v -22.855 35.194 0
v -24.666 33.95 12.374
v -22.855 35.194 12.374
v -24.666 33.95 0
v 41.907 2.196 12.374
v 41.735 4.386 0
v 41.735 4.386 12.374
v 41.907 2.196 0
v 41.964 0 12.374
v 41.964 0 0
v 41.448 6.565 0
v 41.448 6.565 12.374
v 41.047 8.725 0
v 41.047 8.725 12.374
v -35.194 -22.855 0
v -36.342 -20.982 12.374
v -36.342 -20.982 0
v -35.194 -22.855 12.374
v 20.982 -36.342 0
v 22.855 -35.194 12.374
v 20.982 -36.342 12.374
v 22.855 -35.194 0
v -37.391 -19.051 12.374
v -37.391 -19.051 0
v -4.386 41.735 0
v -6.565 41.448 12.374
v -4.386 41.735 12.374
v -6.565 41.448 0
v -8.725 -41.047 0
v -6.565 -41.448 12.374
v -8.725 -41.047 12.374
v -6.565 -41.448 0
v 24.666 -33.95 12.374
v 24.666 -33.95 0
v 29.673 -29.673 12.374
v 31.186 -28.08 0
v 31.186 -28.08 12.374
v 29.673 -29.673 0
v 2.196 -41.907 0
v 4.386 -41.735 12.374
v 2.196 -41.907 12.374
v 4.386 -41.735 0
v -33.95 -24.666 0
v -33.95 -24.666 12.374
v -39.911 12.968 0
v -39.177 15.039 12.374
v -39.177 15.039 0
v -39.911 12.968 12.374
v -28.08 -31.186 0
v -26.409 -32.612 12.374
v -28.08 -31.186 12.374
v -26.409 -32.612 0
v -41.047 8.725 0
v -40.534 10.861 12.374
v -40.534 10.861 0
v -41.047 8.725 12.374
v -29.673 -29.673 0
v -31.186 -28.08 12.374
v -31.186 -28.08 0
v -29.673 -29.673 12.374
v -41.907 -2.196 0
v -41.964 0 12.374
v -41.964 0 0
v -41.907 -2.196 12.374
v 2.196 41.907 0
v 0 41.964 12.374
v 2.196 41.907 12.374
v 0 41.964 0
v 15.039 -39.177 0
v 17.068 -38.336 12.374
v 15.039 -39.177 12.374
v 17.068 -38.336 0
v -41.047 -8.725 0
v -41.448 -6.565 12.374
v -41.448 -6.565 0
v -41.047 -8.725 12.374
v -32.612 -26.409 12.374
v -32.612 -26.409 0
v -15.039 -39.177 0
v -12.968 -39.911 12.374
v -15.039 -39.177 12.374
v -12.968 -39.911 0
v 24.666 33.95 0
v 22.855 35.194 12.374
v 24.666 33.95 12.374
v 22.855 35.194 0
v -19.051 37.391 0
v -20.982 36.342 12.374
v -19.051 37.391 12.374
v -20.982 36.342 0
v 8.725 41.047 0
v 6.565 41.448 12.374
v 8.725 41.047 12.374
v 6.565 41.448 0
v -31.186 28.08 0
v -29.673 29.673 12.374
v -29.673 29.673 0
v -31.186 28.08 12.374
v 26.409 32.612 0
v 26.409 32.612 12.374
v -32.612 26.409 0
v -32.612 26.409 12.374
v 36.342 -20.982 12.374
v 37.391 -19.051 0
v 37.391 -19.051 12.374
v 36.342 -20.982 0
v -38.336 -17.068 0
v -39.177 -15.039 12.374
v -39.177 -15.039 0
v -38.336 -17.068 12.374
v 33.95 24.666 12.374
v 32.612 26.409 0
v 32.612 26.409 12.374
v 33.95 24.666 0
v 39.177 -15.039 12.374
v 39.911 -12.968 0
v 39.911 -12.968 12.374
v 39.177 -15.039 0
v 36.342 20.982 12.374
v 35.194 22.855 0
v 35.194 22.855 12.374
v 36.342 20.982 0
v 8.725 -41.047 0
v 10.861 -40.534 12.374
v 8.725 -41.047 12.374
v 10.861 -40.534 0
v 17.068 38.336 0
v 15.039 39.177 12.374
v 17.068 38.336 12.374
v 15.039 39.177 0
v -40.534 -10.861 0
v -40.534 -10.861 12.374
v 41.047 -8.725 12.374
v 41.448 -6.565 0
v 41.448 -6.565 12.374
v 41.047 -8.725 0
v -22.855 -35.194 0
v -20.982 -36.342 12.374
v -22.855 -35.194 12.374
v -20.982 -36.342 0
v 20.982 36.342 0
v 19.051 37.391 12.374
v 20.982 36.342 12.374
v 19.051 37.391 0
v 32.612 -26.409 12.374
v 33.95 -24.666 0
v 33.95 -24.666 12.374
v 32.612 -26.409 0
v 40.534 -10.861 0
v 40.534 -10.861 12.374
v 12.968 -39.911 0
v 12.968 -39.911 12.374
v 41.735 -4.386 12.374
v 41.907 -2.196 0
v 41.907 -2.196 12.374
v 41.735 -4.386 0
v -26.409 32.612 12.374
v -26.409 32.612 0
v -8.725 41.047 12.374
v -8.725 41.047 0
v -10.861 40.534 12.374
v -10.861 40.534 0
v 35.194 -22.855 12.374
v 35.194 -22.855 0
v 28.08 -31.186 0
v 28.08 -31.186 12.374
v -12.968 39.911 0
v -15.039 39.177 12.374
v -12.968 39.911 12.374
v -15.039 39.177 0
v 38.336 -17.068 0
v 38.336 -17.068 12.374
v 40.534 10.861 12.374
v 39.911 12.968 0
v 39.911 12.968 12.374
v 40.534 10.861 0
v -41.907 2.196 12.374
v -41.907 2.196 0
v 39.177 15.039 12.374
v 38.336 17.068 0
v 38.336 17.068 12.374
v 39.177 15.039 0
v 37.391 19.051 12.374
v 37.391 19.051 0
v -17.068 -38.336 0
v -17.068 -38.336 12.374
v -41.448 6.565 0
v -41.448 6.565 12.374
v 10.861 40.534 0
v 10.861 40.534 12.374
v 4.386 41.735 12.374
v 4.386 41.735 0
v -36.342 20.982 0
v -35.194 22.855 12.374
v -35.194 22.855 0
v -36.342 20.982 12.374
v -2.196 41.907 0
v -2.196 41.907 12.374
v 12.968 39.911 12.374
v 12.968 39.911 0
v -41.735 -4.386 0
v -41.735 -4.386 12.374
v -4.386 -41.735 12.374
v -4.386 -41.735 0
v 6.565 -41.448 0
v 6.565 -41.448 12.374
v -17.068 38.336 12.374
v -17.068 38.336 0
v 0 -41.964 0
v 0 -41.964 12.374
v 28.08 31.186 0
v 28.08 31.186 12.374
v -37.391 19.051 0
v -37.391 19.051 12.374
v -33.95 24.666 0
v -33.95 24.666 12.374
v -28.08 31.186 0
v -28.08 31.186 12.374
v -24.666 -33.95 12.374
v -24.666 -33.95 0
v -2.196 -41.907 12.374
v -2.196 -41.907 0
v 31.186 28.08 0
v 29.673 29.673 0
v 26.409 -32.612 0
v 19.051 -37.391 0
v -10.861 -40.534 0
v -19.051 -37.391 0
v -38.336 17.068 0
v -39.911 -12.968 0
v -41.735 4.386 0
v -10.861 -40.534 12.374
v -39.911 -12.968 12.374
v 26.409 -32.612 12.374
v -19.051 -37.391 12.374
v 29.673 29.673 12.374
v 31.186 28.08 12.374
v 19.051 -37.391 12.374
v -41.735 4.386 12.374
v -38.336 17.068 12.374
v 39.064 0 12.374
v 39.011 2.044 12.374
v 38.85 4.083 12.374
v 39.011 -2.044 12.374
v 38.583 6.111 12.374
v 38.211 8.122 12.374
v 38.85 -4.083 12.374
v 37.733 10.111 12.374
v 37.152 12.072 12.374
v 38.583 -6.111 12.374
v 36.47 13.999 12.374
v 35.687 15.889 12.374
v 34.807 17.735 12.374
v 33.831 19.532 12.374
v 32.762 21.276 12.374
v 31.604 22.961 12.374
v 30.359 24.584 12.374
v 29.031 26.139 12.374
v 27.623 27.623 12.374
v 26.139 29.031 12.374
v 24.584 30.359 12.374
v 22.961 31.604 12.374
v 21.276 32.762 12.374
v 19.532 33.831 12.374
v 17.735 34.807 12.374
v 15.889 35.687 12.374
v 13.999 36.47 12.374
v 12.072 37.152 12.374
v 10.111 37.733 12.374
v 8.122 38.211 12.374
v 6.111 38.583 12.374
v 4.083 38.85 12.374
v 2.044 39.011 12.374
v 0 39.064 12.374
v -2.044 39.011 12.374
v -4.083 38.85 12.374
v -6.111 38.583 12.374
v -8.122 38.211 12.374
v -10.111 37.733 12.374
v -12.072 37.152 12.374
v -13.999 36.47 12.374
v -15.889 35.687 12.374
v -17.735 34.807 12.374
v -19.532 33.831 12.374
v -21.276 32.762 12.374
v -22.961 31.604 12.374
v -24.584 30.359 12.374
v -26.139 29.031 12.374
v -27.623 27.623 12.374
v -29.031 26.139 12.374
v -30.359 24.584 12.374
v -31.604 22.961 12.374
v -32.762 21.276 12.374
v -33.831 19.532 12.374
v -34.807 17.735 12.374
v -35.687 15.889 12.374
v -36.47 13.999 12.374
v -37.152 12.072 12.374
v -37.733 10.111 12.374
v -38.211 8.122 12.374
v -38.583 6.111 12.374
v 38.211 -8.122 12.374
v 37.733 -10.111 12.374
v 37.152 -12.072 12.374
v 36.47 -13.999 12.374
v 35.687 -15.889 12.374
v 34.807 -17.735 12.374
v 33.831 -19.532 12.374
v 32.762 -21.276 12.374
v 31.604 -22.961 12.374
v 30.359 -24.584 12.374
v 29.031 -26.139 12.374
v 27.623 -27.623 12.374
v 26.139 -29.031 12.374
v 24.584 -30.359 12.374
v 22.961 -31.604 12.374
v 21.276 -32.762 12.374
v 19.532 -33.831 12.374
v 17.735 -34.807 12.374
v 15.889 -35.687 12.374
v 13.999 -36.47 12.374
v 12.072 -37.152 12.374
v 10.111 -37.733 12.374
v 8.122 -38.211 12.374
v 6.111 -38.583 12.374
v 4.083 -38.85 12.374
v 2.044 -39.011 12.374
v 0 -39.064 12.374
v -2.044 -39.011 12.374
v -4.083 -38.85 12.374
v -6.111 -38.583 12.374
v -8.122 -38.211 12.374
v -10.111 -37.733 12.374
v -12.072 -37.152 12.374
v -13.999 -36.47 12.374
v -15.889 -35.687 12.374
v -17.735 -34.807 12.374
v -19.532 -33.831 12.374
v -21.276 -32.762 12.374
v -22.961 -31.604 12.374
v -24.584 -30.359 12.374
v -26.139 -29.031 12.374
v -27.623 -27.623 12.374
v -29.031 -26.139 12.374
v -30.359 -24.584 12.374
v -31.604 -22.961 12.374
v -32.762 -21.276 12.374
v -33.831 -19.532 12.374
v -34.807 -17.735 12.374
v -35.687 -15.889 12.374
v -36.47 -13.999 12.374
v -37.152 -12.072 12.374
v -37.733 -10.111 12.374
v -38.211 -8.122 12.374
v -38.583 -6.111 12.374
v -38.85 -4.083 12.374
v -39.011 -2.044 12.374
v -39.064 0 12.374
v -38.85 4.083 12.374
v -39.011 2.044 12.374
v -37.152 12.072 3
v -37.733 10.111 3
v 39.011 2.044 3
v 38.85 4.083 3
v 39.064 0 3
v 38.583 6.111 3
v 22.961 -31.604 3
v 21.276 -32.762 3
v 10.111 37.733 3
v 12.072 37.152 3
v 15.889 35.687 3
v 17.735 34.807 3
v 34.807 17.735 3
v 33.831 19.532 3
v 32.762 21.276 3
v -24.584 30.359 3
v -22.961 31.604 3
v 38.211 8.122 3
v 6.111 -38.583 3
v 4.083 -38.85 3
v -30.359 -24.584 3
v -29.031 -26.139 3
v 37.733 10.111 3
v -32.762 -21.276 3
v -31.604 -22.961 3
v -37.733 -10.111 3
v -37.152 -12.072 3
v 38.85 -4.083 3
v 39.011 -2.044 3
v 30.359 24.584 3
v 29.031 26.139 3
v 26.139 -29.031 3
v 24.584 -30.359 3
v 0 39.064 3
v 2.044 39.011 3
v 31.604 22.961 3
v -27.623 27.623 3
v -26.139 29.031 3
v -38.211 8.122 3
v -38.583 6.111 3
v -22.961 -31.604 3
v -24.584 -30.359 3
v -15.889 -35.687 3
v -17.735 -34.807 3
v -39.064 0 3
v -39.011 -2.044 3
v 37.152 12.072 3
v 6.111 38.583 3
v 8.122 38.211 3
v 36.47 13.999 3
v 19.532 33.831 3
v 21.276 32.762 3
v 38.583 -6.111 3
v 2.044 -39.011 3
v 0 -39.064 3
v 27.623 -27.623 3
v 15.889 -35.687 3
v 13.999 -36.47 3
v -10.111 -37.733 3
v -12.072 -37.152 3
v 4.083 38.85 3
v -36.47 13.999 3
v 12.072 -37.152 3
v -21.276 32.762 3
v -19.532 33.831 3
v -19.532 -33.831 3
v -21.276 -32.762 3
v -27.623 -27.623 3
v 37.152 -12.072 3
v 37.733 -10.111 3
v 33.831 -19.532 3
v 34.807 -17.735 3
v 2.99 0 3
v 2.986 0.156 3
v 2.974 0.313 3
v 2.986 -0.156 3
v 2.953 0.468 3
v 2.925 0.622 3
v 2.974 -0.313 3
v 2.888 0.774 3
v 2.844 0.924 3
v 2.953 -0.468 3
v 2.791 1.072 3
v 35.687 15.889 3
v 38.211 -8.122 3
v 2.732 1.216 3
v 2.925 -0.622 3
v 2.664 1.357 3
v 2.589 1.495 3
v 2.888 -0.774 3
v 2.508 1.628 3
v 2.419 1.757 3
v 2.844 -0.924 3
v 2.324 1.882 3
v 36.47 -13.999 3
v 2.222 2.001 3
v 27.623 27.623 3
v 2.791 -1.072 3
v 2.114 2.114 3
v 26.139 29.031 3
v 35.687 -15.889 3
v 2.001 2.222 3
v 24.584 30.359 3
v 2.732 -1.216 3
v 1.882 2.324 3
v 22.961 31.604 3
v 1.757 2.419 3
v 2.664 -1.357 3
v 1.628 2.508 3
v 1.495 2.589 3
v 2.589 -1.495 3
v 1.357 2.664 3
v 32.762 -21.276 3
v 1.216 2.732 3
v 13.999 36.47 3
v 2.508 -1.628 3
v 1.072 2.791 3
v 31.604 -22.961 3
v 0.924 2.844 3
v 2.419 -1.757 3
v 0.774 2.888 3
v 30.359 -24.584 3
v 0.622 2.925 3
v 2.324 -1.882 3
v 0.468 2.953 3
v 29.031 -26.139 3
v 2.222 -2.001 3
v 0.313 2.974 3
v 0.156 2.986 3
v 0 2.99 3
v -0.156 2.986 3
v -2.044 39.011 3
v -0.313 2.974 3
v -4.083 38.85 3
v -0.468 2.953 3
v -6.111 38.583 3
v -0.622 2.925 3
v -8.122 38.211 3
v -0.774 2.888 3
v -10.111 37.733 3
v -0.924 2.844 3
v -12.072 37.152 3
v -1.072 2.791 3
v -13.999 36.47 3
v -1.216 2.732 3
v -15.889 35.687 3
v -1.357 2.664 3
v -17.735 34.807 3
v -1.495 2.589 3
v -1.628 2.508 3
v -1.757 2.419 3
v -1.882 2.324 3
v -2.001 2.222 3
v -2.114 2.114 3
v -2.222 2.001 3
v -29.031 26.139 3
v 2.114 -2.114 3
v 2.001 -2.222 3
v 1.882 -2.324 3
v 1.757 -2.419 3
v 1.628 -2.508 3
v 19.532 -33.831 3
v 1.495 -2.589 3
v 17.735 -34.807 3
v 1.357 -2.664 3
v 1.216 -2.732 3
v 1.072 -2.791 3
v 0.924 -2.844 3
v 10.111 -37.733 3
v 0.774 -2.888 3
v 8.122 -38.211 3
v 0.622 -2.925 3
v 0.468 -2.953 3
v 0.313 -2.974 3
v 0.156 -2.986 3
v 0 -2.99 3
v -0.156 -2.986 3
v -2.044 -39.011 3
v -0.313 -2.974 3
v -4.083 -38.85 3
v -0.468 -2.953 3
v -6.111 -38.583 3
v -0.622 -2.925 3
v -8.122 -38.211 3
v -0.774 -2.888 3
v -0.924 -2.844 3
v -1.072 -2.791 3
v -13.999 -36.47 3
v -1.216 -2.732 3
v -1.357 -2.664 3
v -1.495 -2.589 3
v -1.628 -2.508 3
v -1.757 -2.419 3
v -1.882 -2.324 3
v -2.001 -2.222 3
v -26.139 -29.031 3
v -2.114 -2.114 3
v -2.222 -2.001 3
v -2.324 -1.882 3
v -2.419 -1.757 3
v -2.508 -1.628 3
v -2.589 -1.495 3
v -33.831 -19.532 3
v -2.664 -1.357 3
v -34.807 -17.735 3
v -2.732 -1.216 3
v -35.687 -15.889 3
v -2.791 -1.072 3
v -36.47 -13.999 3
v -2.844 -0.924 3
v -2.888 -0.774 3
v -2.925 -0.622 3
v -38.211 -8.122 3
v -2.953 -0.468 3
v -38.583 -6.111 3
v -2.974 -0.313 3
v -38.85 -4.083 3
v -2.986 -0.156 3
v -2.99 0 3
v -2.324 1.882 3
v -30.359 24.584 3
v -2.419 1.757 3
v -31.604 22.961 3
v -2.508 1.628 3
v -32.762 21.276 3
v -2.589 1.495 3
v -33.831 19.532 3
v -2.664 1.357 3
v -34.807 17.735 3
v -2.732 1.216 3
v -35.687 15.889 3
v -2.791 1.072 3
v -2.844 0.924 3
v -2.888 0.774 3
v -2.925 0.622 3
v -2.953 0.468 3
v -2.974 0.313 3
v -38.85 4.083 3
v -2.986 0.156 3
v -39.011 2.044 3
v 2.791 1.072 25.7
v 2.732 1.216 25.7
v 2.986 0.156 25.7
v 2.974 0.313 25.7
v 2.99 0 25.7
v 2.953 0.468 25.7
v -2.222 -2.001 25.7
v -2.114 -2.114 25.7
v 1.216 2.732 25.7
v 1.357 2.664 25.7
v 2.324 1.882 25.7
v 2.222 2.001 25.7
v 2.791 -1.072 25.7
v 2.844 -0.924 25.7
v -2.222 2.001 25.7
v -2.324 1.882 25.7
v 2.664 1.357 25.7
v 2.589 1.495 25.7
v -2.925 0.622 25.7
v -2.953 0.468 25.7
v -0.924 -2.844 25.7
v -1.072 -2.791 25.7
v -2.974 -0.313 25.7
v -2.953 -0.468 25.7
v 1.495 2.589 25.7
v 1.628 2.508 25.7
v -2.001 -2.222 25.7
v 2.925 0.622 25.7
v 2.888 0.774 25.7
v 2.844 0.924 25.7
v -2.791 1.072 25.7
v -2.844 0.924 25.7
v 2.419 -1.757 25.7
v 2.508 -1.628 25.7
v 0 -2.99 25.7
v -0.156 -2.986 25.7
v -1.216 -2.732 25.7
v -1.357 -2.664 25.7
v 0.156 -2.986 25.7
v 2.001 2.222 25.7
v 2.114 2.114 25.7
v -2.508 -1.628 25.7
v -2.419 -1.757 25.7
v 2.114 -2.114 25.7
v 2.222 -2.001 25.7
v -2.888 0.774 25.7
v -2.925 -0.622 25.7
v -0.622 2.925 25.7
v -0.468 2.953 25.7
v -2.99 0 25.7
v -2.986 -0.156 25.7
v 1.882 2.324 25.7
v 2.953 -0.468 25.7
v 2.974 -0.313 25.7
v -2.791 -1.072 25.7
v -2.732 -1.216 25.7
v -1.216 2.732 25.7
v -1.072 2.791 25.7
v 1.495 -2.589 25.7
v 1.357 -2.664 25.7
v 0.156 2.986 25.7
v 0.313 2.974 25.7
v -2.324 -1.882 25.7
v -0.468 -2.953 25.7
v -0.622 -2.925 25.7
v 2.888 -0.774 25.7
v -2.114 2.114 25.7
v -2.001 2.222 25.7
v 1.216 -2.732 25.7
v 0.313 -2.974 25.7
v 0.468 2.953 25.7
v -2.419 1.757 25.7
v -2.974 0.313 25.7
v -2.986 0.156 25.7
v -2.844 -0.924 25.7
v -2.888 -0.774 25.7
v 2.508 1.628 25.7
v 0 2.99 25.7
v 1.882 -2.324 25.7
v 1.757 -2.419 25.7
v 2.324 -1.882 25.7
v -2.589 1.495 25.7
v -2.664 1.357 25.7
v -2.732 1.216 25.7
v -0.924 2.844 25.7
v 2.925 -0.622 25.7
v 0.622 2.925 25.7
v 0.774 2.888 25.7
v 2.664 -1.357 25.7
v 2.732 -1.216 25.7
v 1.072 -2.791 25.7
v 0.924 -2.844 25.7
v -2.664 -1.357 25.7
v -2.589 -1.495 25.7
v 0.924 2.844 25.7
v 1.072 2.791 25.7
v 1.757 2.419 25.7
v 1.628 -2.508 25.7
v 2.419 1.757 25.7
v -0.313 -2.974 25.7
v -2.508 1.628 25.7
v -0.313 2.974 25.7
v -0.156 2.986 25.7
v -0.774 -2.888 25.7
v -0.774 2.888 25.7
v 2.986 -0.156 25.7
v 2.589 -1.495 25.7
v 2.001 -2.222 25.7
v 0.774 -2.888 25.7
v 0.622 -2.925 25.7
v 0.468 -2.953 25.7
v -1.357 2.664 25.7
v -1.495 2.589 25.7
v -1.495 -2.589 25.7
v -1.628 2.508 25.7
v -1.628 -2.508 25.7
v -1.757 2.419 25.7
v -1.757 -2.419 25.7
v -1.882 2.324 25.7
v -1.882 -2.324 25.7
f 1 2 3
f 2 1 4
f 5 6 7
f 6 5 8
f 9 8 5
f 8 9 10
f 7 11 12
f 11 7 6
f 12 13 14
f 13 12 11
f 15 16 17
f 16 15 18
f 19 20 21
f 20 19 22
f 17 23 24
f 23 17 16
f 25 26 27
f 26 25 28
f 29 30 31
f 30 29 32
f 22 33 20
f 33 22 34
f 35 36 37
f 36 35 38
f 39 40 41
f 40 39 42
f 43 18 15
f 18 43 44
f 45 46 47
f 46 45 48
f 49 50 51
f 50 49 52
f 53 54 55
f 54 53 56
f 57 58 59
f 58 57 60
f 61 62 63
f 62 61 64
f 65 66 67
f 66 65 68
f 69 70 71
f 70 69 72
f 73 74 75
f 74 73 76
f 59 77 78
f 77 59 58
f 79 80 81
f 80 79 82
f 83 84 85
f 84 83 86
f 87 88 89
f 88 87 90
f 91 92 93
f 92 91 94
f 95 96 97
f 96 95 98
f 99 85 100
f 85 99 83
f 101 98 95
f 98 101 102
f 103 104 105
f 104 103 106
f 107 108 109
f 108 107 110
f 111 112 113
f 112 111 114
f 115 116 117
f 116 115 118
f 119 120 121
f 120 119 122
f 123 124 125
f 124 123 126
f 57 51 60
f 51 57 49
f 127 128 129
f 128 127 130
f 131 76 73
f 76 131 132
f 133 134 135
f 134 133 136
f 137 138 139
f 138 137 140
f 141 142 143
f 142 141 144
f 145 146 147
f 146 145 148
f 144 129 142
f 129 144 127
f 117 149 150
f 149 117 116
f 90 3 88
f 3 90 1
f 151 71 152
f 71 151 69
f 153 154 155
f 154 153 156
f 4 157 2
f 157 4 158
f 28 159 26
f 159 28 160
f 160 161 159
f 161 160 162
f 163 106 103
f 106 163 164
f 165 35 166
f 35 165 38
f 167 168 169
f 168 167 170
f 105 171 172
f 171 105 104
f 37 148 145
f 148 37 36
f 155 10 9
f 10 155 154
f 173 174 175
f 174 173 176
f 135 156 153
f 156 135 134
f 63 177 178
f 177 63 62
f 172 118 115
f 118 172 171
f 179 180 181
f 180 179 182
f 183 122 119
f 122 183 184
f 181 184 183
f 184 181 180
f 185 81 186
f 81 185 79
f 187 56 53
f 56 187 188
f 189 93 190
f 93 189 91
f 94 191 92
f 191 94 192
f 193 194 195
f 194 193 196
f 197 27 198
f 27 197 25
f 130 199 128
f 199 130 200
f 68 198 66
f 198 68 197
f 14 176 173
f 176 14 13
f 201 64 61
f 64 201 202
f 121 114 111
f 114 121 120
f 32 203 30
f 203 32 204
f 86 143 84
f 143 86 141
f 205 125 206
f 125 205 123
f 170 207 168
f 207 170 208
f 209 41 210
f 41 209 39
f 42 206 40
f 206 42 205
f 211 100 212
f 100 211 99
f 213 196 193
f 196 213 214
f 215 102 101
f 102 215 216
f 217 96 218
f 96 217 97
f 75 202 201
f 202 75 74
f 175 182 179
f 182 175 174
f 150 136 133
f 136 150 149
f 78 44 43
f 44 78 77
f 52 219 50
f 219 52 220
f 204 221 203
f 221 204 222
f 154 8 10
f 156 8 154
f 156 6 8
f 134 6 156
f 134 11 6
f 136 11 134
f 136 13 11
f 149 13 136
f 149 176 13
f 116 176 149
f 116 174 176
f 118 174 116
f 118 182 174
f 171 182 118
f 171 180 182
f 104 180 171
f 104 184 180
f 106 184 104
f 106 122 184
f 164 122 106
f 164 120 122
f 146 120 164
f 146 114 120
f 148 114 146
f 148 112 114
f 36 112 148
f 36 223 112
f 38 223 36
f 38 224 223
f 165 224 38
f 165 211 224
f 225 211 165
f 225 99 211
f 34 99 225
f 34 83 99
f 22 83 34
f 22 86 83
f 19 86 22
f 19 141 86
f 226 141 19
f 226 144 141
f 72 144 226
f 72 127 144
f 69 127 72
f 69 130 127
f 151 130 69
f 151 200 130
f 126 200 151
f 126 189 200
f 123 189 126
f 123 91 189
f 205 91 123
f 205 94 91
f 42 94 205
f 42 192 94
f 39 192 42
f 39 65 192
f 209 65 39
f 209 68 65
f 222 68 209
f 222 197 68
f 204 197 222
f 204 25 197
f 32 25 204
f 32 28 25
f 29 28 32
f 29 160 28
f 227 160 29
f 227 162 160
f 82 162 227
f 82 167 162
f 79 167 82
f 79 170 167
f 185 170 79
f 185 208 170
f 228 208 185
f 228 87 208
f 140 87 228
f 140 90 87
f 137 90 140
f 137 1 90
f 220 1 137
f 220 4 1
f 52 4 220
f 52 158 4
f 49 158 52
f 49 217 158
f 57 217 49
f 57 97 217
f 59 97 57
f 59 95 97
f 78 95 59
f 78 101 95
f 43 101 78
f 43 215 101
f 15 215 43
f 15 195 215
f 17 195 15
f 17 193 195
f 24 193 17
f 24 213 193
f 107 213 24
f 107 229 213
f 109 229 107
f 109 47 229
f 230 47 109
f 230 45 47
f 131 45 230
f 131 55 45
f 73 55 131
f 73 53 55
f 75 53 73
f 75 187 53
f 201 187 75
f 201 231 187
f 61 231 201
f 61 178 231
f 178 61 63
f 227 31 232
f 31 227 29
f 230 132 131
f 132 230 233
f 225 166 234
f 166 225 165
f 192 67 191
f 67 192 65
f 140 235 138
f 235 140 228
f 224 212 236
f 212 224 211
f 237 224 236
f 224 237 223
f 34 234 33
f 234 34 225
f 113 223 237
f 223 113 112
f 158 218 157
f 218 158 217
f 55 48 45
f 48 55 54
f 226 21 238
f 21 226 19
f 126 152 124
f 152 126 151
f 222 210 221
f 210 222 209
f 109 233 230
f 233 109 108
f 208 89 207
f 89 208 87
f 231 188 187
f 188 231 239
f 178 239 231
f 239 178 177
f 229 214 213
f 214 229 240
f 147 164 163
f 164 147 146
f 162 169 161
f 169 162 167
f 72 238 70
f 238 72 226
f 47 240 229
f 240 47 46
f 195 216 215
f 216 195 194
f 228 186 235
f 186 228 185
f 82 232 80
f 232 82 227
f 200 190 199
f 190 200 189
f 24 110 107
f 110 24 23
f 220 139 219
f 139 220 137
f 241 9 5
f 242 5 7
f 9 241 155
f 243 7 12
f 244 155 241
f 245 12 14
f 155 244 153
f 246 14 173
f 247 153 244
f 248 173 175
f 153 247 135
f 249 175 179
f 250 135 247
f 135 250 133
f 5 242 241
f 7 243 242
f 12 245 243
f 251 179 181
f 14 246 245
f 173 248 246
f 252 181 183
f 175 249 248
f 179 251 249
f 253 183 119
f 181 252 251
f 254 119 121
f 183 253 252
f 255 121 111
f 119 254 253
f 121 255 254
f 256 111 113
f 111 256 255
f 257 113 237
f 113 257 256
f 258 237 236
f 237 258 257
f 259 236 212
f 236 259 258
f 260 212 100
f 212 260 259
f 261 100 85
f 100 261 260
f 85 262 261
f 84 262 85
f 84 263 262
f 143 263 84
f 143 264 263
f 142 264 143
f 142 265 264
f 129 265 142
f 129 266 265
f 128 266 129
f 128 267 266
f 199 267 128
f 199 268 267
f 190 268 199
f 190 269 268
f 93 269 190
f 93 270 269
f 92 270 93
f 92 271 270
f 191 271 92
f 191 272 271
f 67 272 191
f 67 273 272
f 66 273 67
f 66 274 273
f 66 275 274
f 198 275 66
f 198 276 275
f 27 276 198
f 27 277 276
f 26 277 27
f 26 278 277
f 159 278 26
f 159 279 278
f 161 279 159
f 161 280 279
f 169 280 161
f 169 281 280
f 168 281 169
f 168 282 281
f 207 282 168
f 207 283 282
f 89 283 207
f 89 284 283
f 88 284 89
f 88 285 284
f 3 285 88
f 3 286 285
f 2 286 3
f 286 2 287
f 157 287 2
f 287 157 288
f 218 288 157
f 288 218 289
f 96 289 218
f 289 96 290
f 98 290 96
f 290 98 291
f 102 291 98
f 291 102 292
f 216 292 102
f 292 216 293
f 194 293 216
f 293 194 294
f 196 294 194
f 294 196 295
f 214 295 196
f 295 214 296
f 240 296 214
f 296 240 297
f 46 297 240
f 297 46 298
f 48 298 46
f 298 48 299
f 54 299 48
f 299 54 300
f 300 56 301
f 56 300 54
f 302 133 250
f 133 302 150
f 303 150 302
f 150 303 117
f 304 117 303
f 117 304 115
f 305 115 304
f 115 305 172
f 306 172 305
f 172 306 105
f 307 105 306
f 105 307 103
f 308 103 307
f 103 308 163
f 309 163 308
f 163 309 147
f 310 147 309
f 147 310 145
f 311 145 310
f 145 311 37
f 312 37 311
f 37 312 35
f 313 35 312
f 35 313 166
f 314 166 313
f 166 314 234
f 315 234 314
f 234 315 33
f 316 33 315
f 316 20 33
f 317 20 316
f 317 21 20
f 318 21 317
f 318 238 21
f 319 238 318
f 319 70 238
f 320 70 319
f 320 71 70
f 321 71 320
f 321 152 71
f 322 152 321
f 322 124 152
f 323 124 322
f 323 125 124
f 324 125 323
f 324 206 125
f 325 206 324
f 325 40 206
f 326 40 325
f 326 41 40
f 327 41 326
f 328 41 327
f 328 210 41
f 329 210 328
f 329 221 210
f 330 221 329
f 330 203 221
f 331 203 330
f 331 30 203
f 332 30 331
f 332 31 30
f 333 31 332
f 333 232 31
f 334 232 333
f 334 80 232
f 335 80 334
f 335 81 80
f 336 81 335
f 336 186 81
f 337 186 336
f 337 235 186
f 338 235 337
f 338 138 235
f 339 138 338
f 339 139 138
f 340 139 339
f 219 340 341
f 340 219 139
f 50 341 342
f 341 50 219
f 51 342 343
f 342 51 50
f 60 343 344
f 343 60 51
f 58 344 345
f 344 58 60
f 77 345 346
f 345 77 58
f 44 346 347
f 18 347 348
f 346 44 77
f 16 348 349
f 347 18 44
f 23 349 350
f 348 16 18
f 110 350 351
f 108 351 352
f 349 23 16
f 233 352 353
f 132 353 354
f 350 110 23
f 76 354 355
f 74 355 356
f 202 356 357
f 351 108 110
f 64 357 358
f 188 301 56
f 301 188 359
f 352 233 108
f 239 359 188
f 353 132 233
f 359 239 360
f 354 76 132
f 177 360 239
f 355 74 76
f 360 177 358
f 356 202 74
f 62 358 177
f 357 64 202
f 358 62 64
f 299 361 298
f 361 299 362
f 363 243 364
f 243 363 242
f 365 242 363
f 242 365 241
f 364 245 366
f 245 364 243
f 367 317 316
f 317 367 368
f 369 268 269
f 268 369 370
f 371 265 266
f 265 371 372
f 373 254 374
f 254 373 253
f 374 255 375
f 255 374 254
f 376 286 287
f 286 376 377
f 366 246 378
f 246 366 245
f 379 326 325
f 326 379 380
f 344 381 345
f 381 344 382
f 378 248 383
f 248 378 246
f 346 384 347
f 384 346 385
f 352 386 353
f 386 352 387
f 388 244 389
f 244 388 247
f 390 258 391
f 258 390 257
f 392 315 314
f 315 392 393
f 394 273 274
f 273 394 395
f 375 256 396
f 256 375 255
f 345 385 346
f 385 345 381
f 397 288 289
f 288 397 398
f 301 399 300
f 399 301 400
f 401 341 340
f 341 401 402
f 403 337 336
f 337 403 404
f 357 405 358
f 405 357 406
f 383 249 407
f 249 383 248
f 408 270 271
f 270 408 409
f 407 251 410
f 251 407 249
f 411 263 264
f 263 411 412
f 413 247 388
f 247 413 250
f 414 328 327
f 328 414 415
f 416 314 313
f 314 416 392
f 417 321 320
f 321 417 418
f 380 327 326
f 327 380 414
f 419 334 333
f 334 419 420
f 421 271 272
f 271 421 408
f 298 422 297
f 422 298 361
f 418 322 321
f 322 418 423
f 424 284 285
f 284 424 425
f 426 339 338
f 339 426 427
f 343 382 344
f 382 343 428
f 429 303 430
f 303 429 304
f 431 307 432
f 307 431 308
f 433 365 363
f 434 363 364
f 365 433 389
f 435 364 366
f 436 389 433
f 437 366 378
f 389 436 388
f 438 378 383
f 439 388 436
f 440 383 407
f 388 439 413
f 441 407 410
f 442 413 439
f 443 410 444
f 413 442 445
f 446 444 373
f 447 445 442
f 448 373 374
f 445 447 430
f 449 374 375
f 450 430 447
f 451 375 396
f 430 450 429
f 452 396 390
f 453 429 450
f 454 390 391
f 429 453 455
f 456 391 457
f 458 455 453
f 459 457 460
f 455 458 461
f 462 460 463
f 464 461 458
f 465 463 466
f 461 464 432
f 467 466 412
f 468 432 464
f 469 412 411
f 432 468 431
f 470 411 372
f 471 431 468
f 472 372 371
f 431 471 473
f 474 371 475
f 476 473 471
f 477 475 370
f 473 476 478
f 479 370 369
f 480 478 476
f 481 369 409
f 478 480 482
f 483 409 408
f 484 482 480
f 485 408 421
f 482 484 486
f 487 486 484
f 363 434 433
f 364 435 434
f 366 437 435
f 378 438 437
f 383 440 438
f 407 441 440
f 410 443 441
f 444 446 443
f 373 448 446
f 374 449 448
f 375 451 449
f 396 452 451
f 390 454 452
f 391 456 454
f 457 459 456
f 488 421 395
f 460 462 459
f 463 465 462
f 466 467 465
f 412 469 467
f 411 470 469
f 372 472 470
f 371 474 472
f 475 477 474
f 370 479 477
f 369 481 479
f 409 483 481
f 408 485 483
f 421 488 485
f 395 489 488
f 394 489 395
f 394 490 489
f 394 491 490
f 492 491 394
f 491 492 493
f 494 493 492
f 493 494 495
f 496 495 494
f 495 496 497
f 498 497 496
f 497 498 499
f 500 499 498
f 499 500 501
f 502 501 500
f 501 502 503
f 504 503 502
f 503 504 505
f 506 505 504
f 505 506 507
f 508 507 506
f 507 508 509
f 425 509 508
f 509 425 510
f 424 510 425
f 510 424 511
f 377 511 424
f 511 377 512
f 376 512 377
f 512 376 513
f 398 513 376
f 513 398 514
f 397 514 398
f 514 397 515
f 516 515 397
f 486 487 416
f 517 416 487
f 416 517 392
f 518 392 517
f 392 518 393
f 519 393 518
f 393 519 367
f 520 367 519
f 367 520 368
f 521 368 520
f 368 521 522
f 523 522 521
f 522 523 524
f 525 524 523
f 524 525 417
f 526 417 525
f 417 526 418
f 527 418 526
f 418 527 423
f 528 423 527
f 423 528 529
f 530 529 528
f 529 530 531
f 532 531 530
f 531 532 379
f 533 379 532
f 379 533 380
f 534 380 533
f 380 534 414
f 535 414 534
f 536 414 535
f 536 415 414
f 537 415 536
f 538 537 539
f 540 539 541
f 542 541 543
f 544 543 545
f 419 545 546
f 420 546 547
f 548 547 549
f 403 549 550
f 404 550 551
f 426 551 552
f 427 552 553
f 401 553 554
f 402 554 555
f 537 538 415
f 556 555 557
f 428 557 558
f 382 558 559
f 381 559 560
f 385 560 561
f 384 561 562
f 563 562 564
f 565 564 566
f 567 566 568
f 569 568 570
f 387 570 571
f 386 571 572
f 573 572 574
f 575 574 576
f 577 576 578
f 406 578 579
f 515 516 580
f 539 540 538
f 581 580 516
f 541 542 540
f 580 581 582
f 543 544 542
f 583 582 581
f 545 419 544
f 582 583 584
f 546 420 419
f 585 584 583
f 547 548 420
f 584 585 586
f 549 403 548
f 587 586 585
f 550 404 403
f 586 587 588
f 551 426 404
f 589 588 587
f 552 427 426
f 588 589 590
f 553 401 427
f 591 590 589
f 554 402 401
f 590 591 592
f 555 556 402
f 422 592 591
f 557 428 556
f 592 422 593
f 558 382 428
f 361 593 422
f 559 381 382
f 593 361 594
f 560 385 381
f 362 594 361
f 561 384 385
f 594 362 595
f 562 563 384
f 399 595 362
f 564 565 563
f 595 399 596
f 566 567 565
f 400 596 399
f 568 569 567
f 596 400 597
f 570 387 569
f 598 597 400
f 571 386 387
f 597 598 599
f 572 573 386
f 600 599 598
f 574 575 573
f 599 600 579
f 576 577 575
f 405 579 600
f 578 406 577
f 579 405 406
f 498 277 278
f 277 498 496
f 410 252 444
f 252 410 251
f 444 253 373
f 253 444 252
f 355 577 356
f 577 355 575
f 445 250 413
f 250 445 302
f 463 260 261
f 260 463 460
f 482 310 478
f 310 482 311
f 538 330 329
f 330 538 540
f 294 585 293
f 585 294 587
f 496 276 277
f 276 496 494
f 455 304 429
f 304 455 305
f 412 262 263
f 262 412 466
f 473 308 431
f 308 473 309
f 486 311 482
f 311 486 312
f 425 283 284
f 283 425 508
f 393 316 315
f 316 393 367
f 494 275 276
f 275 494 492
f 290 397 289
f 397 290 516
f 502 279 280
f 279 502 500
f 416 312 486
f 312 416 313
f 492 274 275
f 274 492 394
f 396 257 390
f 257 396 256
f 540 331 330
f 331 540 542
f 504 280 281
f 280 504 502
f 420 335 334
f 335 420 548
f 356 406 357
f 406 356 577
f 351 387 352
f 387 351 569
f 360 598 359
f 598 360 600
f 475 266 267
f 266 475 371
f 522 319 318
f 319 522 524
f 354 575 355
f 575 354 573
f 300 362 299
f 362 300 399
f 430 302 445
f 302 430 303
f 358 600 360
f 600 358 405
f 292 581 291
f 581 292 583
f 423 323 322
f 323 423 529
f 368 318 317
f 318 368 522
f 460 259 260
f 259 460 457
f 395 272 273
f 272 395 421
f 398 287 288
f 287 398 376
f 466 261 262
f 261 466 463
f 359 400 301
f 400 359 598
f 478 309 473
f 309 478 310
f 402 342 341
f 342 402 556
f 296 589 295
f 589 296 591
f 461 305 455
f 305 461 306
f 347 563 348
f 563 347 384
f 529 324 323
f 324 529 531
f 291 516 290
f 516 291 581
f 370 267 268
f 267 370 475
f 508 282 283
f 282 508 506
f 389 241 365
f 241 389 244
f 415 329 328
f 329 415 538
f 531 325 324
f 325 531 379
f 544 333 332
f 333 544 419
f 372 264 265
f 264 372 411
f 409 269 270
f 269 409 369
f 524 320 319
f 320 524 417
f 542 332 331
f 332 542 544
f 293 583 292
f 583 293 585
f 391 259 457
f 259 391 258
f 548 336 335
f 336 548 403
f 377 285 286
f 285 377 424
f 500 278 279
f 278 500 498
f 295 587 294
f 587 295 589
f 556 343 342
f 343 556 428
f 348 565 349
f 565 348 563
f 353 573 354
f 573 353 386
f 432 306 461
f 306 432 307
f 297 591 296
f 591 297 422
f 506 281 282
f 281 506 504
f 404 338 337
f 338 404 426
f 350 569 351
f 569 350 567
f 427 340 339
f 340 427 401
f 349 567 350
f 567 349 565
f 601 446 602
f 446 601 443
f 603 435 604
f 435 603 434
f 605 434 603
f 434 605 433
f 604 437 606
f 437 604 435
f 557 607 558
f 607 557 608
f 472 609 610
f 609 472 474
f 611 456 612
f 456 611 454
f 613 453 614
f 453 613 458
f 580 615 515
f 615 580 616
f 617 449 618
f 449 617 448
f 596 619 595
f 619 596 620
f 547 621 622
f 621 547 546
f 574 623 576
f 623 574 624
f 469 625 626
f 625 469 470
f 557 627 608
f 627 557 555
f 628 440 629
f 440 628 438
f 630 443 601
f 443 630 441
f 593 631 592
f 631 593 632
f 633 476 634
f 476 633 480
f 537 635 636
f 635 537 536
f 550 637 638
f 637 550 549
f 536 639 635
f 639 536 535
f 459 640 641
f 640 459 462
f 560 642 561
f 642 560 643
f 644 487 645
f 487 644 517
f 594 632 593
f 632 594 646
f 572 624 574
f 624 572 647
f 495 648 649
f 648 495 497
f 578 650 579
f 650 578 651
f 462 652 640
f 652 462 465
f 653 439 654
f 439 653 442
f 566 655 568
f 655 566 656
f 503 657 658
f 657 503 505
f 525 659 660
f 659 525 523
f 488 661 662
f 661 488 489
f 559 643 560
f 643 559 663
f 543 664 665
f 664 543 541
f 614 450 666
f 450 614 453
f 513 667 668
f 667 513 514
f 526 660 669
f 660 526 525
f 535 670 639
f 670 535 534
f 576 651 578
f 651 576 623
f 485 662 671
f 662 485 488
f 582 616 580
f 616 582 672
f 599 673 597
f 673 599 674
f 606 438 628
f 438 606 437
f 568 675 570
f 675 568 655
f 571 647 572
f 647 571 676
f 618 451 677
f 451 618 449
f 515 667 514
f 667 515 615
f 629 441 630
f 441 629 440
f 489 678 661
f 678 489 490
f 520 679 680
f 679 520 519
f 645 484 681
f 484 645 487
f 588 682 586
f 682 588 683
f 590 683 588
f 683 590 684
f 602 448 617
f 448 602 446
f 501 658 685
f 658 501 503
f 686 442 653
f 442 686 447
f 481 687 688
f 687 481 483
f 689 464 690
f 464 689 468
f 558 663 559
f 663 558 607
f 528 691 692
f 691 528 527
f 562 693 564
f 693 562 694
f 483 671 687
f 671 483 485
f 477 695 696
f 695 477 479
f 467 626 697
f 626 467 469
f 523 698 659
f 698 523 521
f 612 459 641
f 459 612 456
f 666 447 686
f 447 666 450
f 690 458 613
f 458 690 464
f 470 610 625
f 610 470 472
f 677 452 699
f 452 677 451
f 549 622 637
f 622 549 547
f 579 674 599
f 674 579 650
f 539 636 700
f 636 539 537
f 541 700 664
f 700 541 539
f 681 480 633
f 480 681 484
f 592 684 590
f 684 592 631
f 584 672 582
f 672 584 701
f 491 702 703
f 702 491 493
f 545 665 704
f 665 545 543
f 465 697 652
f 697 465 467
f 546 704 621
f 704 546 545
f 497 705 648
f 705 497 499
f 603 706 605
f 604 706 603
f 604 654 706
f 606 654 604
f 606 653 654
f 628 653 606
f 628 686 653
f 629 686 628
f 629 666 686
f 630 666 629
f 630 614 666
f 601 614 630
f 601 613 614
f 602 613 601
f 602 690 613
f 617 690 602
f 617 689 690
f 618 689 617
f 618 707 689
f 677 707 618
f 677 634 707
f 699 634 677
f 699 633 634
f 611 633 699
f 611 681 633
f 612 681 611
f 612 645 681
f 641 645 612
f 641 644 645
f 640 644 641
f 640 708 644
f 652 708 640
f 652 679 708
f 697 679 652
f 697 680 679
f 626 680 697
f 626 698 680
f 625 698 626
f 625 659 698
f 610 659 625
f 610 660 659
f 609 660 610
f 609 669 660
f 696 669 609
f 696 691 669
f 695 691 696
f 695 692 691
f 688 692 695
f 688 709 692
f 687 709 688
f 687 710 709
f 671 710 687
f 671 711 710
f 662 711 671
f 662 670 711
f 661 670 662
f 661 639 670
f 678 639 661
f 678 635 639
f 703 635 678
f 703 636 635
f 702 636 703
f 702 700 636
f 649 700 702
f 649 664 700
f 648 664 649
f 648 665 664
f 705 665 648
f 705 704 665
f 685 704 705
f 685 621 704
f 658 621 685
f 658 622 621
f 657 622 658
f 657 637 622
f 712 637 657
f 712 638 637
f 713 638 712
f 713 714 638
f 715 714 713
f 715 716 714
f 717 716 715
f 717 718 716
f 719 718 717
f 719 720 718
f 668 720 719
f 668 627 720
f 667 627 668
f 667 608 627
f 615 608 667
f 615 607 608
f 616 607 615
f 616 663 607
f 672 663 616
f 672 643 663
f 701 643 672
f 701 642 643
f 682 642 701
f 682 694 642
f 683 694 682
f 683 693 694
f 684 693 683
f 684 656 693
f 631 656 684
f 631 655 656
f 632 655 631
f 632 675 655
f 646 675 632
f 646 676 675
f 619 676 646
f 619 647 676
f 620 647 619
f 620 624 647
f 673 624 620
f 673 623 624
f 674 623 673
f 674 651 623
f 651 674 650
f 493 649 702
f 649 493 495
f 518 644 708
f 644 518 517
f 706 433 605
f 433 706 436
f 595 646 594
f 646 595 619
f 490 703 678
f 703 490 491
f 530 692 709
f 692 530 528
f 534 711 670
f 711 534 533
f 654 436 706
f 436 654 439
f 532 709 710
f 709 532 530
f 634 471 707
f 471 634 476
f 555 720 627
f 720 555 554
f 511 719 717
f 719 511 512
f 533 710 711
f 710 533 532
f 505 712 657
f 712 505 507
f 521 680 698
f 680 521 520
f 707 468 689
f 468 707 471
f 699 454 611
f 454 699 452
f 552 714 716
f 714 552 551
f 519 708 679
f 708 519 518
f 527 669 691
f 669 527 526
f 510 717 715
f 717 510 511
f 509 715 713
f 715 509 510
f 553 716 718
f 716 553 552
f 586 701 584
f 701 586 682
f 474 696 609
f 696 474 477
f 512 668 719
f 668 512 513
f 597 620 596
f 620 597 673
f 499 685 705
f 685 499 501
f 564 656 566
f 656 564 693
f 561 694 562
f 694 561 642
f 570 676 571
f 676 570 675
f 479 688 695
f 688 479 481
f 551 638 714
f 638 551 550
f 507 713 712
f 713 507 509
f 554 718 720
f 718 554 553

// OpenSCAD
// DS-D · util_concentricidad (M6). Generado por motor/fabricacion/gen_cad.py
include <ds_d_motor_params.scad>
include <motor_lib.scad>
ring_glue_jig();
